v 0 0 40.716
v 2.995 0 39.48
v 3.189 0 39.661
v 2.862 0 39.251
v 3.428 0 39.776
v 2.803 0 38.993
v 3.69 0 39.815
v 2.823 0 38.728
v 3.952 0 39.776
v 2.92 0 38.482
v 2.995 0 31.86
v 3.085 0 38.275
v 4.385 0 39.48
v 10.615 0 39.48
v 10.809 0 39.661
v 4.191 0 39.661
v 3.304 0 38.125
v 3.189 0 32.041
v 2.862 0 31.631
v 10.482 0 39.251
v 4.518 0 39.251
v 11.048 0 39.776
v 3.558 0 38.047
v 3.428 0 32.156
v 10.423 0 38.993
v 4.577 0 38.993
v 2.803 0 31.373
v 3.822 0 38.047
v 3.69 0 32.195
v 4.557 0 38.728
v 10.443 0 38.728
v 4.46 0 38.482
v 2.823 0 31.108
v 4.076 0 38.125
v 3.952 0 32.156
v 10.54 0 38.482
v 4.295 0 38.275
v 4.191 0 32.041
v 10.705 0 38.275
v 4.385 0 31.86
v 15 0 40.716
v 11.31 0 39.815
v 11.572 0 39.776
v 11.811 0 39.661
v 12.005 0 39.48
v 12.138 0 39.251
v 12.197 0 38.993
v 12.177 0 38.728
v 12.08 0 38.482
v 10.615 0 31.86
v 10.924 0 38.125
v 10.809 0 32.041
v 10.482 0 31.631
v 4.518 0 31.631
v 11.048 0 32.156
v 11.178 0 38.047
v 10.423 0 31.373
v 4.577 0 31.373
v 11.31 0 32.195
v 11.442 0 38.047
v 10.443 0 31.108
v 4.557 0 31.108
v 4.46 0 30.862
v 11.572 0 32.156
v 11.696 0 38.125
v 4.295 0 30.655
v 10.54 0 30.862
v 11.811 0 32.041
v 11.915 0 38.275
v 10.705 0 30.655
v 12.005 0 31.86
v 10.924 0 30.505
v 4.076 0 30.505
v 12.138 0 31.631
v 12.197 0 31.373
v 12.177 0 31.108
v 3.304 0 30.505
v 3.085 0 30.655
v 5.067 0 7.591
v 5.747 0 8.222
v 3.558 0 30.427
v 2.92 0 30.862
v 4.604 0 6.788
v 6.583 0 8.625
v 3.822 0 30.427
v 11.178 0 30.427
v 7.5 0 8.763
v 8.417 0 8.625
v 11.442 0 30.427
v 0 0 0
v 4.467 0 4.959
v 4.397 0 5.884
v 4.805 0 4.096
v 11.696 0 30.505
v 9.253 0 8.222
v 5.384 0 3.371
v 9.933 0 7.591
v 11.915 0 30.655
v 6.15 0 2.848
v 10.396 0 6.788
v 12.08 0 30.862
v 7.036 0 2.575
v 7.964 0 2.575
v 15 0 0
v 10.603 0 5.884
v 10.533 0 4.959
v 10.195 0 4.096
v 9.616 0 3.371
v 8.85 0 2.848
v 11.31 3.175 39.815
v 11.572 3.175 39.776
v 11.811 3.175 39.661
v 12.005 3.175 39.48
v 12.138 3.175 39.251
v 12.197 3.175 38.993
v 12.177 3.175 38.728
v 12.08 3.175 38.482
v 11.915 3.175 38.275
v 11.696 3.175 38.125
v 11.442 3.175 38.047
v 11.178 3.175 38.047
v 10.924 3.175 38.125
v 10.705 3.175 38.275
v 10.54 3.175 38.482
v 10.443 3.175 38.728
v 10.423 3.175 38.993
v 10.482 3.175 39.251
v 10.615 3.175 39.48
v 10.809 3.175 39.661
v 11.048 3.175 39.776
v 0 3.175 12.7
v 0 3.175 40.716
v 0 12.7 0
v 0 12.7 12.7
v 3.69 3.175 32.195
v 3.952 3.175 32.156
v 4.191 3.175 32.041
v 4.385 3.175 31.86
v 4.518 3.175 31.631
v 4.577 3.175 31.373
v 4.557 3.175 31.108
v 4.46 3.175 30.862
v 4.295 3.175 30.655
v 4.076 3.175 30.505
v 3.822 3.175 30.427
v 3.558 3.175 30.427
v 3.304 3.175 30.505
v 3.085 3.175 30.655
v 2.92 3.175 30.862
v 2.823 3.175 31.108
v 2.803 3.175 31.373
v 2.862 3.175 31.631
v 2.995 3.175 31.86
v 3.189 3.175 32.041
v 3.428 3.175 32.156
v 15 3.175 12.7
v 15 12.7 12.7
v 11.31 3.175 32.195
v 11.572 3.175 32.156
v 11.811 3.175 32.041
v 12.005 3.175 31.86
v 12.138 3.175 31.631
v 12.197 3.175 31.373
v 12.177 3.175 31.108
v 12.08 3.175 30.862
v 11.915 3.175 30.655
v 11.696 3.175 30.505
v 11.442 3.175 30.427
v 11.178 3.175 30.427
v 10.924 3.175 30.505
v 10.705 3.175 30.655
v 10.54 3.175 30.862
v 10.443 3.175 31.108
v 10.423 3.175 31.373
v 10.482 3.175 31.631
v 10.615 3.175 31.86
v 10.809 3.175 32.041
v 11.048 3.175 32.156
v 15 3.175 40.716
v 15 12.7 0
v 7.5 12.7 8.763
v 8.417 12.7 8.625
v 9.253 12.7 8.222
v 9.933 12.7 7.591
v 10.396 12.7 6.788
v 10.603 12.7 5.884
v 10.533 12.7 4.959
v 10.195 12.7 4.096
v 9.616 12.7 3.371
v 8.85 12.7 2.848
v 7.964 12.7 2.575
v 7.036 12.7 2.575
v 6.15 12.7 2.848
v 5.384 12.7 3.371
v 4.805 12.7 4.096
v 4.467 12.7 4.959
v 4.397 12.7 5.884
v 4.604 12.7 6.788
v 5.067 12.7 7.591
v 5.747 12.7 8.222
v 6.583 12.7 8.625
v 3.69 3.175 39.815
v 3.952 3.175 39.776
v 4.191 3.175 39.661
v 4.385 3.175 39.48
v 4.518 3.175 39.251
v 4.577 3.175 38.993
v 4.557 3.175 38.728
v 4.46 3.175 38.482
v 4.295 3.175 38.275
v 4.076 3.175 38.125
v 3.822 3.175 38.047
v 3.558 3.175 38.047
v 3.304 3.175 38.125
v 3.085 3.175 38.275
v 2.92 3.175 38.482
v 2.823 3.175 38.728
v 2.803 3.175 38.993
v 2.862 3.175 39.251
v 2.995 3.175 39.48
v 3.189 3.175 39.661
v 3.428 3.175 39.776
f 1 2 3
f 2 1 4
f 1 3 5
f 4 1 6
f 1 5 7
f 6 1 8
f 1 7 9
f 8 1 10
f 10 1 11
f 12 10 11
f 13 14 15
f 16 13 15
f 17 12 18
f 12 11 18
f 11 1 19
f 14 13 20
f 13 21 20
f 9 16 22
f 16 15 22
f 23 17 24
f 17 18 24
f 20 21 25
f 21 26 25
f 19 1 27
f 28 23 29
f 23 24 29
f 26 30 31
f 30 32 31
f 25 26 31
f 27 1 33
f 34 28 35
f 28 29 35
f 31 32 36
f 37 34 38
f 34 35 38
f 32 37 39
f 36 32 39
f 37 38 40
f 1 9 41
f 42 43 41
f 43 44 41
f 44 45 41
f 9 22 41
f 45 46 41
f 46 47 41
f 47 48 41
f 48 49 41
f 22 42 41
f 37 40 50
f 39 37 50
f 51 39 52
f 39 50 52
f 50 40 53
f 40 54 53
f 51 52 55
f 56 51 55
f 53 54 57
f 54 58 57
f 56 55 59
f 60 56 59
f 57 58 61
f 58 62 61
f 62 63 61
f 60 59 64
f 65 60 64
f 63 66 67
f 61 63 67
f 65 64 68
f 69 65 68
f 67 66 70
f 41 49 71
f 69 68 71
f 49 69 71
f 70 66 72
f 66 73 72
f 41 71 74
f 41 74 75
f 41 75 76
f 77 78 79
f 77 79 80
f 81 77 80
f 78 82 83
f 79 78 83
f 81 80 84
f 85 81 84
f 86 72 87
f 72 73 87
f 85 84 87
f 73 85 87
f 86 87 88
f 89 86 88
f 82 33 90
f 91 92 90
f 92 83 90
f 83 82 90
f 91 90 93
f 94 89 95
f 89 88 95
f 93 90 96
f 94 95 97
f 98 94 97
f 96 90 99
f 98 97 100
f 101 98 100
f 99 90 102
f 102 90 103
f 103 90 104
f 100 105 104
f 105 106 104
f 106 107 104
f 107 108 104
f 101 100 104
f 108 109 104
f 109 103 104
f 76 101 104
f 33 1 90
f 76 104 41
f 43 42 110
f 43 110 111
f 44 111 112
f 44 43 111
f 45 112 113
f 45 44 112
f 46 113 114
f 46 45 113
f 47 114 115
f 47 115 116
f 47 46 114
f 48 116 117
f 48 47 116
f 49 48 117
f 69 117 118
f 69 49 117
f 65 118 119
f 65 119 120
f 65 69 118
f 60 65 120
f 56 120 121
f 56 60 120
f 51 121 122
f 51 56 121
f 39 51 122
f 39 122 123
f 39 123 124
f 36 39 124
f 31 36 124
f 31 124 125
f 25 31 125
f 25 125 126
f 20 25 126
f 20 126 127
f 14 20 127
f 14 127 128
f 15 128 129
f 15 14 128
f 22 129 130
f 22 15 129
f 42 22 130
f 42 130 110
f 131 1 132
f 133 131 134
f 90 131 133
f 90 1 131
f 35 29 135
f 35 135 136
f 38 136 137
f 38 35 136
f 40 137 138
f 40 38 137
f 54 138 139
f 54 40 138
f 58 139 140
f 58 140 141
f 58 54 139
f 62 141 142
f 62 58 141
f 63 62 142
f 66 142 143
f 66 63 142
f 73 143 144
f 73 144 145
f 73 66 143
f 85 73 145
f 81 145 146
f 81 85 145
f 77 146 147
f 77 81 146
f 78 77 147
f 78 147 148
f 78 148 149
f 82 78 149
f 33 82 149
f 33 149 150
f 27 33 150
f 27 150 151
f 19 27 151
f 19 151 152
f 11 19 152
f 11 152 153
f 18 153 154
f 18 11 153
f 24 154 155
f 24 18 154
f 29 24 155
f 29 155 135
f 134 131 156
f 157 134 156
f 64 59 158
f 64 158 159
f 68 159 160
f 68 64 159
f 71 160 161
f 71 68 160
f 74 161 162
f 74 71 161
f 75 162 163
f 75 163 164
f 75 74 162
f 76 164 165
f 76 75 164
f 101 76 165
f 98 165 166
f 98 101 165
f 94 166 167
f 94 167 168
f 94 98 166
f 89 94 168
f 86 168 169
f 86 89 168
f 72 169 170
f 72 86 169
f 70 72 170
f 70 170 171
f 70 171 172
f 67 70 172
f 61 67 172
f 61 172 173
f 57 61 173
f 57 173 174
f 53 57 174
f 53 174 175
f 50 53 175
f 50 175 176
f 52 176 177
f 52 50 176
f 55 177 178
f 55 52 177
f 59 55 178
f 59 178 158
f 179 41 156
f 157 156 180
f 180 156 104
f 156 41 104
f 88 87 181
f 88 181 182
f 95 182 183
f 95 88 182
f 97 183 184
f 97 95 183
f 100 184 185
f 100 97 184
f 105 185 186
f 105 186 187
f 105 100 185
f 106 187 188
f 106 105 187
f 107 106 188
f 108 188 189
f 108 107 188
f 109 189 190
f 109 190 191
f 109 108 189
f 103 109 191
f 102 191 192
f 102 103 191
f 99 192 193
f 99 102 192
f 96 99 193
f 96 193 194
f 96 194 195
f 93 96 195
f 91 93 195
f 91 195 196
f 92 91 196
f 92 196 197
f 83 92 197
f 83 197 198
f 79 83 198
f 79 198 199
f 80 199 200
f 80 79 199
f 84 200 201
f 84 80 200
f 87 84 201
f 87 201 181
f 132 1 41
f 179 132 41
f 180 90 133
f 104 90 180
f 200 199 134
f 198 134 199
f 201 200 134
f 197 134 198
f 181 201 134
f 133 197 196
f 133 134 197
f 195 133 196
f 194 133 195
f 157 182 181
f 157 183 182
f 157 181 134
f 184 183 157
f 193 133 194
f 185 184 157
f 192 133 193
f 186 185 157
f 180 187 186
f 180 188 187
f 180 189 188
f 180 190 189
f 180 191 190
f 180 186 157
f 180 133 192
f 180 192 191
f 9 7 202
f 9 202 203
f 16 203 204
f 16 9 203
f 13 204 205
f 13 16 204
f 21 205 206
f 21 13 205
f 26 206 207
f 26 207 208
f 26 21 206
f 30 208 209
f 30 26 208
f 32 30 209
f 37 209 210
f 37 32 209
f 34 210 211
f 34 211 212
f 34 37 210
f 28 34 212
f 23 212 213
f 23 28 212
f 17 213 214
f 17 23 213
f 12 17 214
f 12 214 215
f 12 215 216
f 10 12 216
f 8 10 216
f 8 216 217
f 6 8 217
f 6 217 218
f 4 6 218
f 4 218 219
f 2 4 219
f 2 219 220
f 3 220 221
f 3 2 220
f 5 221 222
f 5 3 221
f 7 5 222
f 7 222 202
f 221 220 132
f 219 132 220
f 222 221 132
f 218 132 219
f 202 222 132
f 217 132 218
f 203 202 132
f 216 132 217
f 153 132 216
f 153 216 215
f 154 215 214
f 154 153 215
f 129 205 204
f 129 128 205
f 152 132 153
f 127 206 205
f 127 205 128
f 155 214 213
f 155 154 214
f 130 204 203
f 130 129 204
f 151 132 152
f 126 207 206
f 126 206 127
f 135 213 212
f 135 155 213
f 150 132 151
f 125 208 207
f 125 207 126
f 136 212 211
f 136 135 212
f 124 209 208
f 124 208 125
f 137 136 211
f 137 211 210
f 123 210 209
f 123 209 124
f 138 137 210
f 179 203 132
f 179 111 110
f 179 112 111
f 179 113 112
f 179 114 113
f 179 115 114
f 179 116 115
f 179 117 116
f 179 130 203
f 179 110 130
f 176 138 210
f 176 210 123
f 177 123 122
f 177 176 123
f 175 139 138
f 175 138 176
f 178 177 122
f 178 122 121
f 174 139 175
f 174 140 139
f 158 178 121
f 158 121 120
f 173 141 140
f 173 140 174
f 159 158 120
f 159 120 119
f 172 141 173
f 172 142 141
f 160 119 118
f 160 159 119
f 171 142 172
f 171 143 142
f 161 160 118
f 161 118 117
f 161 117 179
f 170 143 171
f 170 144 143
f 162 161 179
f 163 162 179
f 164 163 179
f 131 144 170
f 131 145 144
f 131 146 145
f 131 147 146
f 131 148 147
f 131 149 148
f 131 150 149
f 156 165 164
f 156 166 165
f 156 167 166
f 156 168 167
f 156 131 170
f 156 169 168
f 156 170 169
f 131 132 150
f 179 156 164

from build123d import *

# Parameters (mm, degrees)
SKETCH1_W           = 15
SKETCH1_H           = 28.0162
SKETCH1_R           = 0.889
BOSS_EXTRUDE1_DEPTH = 3.175
SKETCH1_3_W         = 15
SKETCH1_3_H         = 12.7
SKETCH1_3_R         = 3.1115
BOSS_EXTRUDE2_DEPTH = 12.7


with BuildPart() as part:
    # Sketch1 → Boss-Extrude1 (new body)
    with BuildSketch(Plane(origin=(0, 0, 0), x_dir=(1, 0, 0), z_dir=(0, 1, 0))):
        with Locations((7.5, -26.7081)):
            Rectangle(SKETCH1_W, SKETCH1_H)
        with Locations((3.69, -38.9262)):
            Circle(SKETCH1_R, mode=Mode.SUBTRACT)
        with Locations((3.69, -31.3062)):
            Circle(SKETCH1_R, mode=Mode.SUBTRACT)
        with Locations((11.31, -38.9262)):
            Circle(SKETCH1_R, mode=Mode.SUBTRACT)
        with Locations((11.31, -31.3062)):
            Circle(SKETCH1_R, mode=Mode.SUBTRACT)
    extrude(amount=BOSS_EXTRUDE1_DEPTH)

    # Sketch1<3> → Boss-Extrude2 (add)
    with BuildSketch(Plane(origin=(0, 0, 0), x_dir=(1, 0, 0), z_dir=(0, 1, 0))):
        with Locations((7.5, -6.35)):
            Rectangle(SKETCH1_3_W, SKETCH1_3_H)
        with Locations((7.5, -5.6515)):
            Circle(SKETCH1_3_R, mode=Mode.SUBTRACT)
    extrude(amount=BOSS_EXTRUDE2_DEPTH)


solid = part.part
